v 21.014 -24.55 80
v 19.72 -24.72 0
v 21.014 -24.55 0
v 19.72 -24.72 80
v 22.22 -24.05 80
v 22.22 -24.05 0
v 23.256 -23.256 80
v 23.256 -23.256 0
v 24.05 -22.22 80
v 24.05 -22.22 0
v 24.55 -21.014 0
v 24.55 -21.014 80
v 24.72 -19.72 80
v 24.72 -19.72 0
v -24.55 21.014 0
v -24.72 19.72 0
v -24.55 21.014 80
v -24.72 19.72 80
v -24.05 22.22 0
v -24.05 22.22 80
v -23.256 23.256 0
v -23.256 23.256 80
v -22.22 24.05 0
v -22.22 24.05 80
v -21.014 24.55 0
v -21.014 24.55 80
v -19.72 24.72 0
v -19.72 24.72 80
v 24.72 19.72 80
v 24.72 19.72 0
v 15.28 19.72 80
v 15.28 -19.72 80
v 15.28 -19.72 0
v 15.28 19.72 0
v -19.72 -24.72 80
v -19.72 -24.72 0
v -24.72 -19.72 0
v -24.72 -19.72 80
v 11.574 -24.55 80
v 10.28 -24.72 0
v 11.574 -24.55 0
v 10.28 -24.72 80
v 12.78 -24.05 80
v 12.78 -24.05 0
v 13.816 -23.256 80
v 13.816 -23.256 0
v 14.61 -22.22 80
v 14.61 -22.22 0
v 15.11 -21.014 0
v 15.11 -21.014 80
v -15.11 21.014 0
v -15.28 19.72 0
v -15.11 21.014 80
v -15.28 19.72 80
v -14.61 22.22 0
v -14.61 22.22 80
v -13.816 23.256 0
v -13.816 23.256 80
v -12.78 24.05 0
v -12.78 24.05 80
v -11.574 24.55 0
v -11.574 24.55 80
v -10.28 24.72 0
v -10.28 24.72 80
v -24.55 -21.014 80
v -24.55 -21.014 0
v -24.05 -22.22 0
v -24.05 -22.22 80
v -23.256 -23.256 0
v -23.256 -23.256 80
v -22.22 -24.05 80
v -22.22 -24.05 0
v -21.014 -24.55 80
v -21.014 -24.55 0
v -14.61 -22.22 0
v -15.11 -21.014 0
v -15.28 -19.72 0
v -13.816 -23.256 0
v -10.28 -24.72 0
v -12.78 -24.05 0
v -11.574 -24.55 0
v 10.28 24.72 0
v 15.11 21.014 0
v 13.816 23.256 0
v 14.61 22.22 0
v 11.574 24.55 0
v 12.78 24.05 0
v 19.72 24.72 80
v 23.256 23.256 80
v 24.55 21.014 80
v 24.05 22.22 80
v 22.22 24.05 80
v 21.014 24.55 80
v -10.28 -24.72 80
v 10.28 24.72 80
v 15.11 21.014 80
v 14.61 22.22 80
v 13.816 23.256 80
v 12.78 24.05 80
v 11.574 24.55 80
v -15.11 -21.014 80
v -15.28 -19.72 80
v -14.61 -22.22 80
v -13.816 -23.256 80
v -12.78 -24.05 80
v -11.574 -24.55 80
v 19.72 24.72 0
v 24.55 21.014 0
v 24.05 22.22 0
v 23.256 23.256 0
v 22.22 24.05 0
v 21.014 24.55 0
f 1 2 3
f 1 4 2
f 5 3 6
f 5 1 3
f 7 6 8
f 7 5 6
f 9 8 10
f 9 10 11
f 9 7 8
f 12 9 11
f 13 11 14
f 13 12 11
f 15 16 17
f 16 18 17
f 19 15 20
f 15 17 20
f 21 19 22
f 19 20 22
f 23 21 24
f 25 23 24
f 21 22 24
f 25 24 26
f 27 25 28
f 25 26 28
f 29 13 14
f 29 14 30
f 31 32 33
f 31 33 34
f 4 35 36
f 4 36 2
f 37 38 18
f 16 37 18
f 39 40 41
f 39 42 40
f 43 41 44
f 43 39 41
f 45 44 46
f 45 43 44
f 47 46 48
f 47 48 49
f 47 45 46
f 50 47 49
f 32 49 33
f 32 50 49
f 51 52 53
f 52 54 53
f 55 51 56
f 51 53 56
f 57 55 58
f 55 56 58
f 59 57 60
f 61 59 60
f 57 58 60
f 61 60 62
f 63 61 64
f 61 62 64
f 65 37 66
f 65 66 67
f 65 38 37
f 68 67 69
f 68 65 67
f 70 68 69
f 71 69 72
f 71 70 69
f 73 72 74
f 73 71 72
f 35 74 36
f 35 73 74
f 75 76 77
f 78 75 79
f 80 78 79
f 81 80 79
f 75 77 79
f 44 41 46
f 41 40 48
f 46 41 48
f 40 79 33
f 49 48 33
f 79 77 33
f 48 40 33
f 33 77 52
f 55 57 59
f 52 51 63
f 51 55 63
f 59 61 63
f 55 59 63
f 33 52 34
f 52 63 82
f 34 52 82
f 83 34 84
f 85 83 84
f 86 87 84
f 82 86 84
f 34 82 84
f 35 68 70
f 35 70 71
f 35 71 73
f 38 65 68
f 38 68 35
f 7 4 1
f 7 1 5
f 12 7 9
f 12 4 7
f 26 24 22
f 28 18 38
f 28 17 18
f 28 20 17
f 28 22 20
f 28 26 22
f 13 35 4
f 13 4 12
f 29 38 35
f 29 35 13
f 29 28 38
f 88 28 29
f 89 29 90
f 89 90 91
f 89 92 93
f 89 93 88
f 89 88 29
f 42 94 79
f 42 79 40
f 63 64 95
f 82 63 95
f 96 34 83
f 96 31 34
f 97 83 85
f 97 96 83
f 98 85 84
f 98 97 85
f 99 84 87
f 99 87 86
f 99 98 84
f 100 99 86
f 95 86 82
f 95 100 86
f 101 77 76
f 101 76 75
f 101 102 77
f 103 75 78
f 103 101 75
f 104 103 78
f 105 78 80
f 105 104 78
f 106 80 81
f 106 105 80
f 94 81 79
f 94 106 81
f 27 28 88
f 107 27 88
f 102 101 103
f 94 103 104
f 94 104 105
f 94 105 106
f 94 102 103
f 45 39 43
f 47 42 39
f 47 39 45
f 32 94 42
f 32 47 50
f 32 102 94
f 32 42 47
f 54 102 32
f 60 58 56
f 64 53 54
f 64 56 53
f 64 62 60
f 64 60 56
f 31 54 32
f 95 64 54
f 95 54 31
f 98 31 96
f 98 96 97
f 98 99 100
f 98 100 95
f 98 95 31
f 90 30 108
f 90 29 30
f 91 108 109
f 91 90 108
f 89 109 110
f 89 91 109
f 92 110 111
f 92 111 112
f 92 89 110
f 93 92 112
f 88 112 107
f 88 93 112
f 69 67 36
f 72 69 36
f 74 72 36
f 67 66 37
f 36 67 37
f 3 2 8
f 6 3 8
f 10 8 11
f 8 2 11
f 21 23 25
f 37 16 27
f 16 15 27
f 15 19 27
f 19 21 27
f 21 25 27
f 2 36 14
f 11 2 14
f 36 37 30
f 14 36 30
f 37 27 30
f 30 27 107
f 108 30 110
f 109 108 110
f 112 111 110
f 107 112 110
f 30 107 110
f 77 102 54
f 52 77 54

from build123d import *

# Parameters (mm, degrees)
F0_W     = 49.44
F0_H     = 49.44
F1_DEPTH = 80
F2_R     = 5
F3_W     = 30.56
F3_H     = 49.44
F4_DEPTH = 80
F5_R     = 5


with BuildPart() as f1:
    # F0 (on Top) → F1 (new body)
    with BuildSketch(Plane.XY):
        Rectangle(F0_W, F0_H)
    extrude(amount=F1_DEPTH)

    # F2
    f2_edges = [f1.edges().sort_by_distance(p)[0] for p in [
        (-24.72, 24.72, 40),
        (-24.72, -24.72, 40),
        (24.72, -24.72, 40),
        (24.72, 24.72, 40),
    ]]
    fillet(f2_edges, radius=F2_R)


with BuildPart() as f4:
    # F3 (on Top) → F4 (new body)
    with BuildSketch(Plane.XY):
        Rectangle(F3_W, F3_H)
    extrude(amount=F4_DEPTH)

    # F5
    f5_edges = [f4.edges().sort_by_distance(p)[0] for p in [
        (-15.28, -24.72, 40),
        (15.28, -24.72, 40),
        (15.28, 24.72, 40),
        (-15.28, 24.72, 40),
    ]]
    fillet(f5_edges, radius=F5_R)


solid = Compound([f1.part, f4.part])
